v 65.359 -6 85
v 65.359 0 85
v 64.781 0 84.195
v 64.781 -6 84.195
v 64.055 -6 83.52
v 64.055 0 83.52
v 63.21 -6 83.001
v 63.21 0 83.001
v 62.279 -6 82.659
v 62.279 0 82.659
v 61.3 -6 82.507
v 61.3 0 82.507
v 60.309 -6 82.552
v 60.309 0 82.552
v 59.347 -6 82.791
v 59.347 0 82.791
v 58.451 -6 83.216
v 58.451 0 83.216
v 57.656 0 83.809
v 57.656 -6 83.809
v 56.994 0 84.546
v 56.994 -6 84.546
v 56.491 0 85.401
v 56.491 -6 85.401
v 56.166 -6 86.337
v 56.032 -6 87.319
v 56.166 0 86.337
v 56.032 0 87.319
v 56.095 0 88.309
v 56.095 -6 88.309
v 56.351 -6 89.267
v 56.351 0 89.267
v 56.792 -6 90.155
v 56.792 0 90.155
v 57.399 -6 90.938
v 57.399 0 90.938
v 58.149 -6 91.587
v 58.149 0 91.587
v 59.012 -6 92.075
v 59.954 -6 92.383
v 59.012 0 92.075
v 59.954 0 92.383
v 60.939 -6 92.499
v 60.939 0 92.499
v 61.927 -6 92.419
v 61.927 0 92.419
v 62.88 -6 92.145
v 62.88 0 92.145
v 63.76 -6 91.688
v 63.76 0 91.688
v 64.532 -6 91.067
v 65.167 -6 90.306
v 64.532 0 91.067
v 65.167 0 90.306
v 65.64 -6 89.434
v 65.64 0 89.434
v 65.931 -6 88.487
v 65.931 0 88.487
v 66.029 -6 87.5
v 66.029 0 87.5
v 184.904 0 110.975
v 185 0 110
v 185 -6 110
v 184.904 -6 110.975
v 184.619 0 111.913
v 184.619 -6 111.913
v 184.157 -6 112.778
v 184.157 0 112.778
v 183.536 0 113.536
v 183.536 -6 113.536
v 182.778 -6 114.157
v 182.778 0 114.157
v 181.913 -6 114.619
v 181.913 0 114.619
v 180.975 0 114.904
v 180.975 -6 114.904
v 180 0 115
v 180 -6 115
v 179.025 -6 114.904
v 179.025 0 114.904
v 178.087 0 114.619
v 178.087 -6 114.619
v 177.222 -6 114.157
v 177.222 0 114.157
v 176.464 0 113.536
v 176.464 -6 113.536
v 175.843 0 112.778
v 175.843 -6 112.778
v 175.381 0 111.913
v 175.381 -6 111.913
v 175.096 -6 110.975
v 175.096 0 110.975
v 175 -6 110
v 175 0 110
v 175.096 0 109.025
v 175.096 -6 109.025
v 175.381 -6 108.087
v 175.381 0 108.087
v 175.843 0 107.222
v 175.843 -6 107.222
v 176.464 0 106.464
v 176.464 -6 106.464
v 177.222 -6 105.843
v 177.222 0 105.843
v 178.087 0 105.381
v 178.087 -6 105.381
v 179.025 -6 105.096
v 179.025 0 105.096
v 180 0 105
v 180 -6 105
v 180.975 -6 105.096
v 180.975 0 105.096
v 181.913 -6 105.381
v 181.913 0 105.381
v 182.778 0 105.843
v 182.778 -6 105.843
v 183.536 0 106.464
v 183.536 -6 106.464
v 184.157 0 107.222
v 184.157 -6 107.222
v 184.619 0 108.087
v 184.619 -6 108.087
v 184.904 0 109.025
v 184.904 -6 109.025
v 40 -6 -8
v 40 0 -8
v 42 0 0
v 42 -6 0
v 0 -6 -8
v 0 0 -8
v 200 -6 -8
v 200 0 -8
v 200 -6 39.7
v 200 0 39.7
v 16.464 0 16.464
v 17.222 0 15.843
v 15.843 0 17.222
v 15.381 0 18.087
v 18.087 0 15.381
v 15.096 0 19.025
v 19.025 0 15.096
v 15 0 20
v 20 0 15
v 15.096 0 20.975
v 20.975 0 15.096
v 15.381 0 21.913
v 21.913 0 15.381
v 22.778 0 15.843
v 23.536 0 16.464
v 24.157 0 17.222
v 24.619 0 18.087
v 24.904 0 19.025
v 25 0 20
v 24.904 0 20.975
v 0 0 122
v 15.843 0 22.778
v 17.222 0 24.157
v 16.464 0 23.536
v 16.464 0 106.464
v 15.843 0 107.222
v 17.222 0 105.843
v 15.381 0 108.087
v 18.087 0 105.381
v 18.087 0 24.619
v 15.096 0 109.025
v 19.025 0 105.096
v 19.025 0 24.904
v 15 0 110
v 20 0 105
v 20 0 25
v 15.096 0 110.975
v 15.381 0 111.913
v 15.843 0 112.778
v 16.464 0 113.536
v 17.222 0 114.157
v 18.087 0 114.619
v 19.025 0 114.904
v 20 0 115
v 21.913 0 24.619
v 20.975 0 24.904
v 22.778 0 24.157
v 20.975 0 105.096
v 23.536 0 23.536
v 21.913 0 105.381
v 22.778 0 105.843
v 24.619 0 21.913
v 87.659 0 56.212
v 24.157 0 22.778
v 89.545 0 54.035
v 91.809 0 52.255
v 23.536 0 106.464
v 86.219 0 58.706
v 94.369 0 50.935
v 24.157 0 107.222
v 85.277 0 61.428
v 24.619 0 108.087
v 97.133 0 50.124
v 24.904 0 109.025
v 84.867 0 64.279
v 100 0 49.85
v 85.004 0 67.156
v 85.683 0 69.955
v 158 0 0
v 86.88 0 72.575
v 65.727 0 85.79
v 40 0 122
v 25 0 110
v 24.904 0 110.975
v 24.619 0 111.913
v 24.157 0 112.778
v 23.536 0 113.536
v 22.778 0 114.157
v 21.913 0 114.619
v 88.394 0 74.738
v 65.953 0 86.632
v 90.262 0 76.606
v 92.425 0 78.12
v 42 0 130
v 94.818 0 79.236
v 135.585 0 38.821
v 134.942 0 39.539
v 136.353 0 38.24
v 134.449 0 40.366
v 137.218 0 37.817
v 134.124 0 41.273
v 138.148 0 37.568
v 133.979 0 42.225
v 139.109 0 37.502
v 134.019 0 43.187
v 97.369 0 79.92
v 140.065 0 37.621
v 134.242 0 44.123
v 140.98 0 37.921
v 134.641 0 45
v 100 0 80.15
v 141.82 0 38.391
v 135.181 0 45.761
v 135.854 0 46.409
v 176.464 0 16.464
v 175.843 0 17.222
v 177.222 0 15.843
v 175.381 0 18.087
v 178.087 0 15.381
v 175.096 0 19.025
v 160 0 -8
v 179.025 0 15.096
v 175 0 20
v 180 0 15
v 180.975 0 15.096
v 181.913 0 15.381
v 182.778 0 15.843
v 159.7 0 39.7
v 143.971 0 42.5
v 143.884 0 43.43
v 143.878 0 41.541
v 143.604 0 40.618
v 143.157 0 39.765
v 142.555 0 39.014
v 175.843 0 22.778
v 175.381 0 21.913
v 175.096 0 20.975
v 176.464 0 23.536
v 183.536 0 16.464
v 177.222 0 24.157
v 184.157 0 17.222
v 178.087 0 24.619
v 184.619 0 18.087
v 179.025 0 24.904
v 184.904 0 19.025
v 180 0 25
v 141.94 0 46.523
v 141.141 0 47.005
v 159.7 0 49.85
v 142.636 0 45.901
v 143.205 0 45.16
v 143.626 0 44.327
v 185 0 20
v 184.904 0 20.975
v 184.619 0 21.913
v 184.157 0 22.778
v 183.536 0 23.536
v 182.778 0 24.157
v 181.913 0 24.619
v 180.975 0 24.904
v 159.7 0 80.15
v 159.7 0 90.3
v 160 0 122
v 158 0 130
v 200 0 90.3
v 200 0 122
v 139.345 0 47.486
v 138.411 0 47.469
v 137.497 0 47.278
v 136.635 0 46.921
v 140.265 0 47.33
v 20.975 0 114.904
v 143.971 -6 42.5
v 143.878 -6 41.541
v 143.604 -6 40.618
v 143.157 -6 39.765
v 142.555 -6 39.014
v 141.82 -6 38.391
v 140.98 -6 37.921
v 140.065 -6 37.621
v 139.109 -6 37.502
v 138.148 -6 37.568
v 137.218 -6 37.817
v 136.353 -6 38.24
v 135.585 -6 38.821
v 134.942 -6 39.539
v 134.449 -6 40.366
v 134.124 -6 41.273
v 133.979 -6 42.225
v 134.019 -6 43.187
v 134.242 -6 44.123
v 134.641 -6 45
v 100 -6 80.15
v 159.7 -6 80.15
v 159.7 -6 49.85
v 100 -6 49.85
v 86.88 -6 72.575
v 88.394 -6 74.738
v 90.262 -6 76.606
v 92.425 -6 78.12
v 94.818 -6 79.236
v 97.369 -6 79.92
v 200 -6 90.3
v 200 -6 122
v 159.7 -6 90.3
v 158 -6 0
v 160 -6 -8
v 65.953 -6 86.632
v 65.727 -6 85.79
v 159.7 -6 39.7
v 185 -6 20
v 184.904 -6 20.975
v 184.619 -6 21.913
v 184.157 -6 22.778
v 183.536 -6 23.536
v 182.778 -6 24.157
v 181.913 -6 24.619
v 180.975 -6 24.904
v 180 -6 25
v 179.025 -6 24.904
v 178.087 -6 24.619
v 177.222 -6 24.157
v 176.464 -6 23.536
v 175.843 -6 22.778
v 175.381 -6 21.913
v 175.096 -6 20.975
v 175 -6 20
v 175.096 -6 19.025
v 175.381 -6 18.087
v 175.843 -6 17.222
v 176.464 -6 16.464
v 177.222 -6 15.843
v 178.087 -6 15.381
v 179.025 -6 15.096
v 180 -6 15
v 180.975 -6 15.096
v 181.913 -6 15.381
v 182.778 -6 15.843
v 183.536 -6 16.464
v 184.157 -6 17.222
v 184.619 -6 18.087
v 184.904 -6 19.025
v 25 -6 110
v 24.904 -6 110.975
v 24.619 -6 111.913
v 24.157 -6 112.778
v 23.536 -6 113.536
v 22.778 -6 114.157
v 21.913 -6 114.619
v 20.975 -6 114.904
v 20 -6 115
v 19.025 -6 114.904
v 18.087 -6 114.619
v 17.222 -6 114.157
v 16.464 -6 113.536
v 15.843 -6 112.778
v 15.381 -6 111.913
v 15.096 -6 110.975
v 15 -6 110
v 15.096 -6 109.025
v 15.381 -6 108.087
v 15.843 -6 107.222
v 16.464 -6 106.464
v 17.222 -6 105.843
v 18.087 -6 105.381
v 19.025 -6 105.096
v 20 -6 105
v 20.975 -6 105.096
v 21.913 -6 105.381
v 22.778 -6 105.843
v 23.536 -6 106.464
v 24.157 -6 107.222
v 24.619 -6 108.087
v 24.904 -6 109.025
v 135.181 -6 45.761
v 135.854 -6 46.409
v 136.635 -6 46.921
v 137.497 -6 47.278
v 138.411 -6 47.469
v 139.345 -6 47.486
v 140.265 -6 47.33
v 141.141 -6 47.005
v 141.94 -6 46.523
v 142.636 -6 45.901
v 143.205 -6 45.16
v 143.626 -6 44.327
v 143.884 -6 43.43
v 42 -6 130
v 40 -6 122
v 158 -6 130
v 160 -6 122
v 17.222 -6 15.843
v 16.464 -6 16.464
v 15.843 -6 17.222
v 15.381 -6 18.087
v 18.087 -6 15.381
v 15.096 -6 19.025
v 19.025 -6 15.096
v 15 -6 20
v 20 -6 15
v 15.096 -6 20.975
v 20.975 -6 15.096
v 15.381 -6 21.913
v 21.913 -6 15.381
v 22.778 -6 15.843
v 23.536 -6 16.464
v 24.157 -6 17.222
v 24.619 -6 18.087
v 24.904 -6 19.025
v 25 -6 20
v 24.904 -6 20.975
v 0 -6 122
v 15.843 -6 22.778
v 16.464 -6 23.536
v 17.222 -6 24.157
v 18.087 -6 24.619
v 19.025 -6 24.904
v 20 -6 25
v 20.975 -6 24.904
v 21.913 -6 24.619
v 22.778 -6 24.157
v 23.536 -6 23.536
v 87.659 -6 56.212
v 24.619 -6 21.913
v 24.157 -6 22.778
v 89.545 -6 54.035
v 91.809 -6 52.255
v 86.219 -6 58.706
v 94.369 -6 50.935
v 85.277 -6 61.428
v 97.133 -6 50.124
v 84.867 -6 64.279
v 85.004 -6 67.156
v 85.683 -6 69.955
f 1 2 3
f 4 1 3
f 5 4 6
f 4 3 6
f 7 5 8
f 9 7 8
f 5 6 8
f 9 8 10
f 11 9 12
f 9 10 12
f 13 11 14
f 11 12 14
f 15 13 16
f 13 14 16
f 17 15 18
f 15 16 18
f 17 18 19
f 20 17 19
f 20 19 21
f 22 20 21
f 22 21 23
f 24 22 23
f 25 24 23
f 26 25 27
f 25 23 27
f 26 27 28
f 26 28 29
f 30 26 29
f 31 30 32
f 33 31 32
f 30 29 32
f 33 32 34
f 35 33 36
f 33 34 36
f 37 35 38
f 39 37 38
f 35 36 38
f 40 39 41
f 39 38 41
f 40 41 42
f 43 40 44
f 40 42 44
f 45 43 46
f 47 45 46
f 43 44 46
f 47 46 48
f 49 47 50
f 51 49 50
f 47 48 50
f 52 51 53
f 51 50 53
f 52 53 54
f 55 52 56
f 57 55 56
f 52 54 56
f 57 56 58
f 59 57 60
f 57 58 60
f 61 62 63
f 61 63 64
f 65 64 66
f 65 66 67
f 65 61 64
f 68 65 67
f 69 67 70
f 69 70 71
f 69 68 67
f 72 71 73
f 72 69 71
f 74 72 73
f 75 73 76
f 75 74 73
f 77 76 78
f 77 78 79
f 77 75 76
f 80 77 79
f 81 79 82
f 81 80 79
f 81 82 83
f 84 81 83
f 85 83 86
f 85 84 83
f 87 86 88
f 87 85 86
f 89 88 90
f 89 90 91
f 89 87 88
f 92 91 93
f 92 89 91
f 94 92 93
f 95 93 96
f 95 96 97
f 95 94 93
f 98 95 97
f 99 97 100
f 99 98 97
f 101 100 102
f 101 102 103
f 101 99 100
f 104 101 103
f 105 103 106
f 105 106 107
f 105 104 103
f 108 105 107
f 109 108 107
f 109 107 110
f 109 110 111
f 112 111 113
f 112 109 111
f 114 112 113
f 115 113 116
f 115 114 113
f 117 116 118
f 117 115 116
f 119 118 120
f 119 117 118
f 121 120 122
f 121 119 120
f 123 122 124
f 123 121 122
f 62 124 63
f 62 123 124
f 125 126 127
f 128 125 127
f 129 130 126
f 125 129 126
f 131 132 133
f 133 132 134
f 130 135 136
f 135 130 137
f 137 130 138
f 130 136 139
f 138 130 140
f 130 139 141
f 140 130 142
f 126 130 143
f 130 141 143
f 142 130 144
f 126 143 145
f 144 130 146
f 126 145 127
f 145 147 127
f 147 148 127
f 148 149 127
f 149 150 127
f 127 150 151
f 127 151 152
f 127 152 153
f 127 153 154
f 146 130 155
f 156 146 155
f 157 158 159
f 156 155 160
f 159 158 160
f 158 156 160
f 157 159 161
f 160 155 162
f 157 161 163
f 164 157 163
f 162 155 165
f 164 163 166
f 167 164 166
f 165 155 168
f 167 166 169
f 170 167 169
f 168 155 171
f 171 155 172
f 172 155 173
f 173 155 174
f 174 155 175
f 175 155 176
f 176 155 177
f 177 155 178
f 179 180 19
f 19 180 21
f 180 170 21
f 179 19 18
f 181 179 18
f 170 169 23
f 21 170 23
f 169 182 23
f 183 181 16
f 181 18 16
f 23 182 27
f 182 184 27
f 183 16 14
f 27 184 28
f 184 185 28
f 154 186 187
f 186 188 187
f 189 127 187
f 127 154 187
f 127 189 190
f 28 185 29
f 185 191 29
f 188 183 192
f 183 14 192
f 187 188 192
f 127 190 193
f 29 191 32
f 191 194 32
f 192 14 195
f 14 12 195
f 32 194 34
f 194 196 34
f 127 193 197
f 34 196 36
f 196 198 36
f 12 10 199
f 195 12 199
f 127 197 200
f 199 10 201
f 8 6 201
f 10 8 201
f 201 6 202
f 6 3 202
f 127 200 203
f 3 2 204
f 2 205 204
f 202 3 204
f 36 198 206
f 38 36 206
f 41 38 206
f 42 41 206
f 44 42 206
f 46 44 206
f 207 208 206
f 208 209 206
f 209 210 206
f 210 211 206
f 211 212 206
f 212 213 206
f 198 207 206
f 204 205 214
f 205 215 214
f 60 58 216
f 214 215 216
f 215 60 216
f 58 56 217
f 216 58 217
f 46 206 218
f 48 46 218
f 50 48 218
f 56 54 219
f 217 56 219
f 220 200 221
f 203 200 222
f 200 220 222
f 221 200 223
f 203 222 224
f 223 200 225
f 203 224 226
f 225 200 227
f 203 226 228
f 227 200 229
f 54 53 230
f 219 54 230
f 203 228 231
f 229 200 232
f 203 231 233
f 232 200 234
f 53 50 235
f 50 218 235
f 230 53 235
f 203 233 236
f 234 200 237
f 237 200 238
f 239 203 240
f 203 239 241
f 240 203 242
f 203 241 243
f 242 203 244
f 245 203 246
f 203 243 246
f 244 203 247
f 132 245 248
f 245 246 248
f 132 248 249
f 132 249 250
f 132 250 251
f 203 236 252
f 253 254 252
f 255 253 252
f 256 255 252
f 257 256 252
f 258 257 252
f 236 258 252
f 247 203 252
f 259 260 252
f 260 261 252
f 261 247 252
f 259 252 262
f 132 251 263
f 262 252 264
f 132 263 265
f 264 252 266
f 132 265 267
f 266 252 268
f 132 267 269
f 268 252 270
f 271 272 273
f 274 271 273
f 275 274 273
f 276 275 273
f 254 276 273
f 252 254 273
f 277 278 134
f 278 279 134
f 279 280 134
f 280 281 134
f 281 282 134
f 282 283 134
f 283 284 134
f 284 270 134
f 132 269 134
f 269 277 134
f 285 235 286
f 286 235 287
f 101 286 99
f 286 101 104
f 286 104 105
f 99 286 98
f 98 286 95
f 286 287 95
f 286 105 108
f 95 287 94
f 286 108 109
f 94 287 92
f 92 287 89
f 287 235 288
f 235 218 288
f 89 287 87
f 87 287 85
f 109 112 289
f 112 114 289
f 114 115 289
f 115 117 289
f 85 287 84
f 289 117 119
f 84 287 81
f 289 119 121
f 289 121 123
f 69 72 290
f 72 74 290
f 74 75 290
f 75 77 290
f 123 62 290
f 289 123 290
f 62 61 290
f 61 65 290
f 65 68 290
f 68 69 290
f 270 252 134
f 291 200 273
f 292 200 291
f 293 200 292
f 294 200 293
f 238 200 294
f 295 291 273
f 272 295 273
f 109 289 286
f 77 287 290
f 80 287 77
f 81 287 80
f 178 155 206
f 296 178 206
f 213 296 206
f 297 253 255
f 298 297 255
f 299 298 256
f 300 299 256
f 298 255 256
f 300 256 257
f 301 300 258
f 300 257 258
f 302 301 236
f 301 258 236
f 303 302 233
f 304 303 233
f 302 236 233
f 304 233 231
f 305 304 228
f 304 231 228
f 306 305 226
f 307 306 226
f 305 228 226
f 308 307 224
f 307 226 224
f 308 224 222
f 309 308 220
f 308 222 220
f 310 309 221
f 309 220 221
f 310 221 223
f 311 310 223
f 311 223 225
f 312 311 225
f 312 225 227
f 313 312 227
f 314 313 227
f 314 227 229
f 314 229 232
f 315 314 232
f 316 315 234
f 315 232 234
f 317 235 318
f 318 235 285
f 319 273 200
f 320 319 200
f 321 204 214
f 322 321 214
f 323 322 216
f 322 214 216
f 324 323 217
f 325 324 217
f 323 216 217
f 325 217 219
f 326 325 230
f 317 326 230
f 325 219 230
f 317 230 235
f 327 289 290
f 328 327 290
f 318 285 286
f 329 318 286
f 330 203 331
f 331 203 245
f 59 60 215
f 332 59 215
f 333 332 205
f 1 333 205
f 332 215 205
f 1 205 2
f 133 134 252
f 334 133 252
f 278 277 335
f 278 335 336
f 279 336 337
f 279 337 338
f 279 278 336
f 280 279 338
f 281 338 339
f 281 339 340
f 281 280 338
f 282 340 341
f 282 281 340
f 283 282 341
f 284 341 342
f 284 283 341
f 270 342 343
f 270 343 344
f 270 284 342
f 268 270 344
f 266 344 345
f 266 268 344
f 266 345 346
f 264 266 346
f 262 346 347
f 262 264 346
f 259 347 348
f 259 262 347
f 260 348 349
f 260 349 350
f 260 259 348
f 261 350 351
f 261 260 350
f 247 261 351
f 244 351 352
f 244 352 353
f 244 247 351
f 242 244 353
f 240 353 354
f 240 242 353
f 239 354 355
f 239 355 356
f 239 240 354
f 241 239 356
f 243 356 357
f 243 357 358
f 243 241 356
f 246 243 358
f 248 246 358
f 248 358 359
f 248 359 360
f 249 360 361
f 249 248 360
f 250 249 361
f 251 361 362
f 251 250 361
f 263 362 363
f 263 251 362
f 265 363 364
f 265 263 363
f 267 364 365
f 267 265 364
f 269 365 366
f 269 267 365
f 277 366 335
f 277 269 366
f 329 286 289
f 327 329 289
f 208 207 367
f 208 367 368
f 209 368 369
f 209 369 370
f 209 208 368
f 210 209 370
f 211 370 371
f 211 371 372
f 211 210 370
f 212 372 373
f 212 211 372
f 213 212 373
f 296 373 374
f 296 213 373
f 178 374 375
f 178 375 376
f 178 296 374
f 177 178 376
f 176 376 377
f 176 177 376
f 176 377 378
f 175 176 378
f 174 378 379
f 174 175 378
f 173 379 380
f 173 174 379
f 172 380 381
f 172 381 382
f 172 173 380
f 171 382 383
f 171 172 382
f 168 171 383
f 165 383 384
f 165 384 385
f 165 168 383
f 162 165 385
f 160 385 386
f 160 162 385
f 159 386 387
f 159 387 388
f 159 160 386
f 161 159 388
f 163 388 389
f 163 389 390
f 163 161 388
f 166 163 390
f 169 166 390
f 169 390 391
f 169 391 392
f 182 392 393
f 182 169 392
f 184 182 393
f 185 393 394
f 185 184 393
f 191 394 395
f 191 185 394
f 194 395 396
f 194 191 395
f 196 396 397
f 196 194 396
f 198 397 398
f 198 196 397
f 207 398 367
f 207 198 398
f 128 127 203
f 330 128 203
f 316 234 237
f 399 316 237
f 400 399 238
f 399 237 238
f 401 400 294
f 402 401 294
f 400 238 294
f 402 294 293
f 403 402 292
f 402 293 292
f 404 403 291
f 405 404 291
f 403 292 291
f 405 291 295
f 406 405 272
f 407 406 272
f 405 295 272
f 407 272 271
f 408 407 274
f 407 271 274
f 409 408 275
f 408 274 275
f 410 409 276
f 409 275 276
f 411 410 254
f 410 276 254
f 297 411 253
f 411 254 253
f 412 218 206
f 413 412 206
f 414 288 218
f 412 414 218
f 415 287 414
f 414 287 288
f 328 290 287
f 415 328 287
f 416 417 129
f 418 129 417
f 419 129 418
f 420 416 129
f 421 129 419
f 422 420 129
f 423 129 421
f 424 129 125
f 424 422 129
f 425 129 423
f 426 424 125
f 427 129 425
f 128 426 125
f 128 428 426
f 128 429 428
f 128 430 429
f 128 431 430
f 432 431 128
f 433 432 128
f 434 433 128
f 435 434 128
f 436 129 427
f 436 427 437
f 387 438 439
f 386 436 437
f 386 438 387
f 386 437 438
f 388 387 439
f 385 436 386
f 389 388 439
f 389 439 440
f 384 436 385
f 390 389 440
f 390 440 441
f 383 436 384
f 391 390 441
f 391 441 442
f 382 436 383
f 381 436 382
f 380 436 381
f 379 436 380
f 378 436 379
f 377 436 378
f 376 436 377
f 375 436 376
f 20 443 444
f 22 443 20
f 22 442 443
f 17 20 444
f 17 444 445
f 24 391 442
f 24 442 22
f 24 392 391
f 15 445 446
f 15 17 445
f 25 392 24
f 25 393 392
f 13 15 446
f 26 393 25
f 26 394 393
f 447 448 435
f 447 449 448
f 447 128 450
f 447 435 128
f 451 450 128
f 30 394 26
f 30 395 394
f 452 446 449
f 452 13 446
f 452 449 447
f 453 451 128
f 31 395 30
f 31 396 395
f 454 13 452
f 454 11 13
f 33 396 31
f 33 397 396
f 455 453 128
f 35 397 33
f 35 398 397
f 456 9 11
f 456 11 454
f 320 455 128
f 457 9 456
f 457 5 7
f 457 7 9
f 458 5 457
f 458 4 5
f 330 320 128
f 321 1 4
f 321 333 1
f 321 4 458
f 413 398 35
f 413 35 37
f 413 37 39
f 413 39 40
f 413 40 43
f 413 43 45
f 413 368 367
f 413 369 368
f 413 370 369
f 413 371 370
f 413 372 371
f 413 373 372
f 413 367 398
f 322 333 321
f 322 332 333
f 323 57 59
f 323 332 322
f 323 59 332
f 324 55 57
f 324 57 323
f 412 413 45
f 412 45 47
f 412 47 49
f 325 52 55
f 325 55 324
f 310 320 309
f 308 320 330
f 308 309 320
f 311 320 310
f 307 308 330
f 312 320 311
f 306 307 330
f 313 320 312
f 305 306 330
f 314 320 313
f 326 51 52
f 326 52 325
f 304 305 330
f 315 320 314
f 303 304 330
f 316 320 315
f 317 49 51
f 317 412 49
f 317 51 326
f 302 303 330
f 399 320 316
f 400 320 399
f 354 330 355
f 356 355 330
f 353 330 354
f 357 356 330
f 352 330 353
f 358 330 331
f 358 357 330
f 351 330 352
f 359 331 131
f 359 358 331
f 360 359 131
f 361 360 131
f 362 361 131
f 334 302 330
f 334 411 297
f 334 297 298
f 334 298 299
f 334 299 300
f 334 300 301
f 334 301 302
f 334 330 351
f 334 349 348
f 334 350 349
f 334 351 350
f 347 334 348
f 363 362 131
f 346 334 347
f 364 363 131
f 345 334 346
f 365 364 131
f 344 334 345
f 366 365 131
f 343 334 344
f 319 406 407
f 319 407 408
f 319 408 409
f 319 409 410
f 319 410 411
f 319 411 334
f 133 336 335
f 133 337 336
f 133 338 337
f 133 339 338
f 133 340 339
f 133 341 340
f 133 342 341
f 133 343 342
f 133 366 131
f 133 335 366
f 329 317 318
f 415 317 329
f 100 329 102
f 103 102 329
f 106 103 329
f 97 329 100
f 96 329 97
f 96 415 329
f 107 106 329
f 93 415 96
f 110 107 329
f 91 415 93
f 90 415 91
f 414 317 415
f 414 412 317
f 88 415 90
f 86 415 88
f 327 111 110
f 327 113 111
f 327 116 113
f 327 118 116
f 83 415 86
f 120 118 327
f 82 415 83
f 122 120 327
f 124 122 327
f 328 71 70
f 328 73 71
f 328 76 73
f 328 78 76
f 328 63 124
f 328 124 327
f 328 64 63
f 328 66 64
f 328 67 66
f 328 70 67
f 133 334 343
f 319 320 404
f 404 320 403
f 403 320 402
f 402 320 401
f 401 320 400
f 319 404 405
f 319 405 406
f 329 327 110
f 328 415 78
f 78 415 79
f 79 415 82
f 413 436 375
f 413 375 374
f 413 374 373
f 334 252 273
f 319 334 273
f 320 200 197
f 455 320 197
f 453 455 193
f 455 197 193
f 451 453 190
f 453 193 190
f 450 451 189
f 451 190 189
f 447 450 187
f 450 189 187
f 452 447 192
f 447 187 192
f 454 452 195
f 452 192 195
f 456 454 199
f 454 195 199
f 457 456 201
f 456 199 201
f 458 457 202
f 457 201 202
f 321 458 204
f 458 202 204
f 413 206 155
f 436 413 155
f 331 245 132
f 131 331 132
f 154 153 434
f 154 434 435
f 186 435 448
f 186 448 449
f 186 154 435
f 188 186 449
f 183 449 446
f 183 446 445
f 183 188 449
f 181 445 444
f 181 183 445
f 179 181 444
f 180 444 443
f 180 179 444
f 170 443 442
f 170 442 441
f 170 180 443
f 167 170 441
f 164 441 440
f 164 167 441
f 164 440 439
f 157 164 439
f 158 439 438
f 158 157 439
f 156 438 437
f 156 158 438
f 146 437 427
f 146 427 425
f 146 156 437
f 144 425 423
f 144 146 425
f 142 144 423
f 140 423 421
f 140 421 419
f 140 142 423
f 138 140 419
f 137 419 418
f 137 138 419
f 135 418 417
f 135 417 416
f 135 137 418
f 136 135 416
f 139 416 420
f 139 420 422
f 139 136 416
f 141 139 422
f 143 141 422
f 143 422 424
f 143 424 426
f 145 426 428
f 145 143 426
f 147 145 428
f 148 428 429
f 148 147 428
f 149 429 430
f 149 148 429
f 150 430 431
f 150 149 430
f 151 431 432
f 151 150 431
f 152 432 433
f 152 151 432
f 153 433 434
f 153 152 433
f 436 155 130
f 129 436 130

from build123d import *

# Parameters (mm, degrees)
F0_R     = 5
F0_W     = 40
F0_H     = 8
F1_DEPTH = 6


# Not quite as in the source:
# - a feature names something its author has since deleted; it is built from what else it names


with BuildPart() as f1:
    # F0 (on Front) → F1 (new body)
    with BuildSketch(Plane.XZ):
        with BuildLine():
            Line((0, 122), (0, 0))
            Line((0, 0), (40, 0))
            Line((40, 0), (42, 0))
            Line((42, 0), (158, 0))
            Line((158, 0), (160, 0))
            Line((160, 0), (200, 0))
            Line((200, 0), (200, 39.7))
            Line((200, 39.7), (159.7, 39.7))
            Line((159.7, 39.7), (159.7, 49.85))
            Line((159.7, 49.85), (126.2405697347, 49.85))
            Line((126.2405697347, 49.85), (100, 49.85))
            ThreePointArc((100, 49.85), (86.8797151327, 57.425), (86.8797151327, 72.575))
            ThreePointArc((86.8797151327, 72.575), (92.425, 78.1202848673), (100, 80.15))
            Line((100, 80.15), (159.7, 80.15))
            Line((159.7, 80.15), (159.7, 90.3))
            Line((159.7, 90.3), (200, 90.3))
            Line((200, 90.3), (200, 122))
            Line((200, 122), (160, 122))
            Line((160, 122), (158, 130))
            Line((158, 130), (42, 130))
            Line((42, 130), (40, 122))
            Line((40, 122), (0, 122))
        make_face()
        with Locations((20, 20)):
            Circle(F0_R, mode=Mode.SUBTRACT)
        with Locations((180, 20)):
            Circle(F0_R, mode=Mode.SUBTRACT)
        with BuildLine():
            ThreePointArc((143.9711431703, 42.5), (137.6770479448, 37.6703708686), (134.6410161514, 45))
            ThreePointArc((134.6410161514, 45), (140.2652383958, 47.3296291314), (143.9711431703, 42.5))
        make_face(mode=Mode.SUBTRACT)
        with BuildLine():
            ThreePointArc((66.0288568297, 87.5), (65.8584859611, 86.2059047745), (65.3589838486, 85))
            ThreePointArc((65.3589838486, 85), (56.1992276983, 88.7940952255), (66.0288568297, 87.5))
        make_face(mode=Mode.SUBTRACT)
        with Locations((20, 110)):
            Circle(F0_R, mode=Mode.SUBTRACT)
        with Locations((180, 110)):
            Circle(F0_R, mode=Mode.SUBTRACT)
        with Locations((20, -4)):
            Rectangle(F0_W, F0_H)
        with Locations((180, -4)):
            Rectangle(F0_W, F0_H)
        Polygon((42, 0), (40, 0), (40, -8), align=None)
        Polygon((160, 0), (158, 0), (160, -8), align=None)
    extrude(amount=F1_DEPTH)


solid = f1.part
